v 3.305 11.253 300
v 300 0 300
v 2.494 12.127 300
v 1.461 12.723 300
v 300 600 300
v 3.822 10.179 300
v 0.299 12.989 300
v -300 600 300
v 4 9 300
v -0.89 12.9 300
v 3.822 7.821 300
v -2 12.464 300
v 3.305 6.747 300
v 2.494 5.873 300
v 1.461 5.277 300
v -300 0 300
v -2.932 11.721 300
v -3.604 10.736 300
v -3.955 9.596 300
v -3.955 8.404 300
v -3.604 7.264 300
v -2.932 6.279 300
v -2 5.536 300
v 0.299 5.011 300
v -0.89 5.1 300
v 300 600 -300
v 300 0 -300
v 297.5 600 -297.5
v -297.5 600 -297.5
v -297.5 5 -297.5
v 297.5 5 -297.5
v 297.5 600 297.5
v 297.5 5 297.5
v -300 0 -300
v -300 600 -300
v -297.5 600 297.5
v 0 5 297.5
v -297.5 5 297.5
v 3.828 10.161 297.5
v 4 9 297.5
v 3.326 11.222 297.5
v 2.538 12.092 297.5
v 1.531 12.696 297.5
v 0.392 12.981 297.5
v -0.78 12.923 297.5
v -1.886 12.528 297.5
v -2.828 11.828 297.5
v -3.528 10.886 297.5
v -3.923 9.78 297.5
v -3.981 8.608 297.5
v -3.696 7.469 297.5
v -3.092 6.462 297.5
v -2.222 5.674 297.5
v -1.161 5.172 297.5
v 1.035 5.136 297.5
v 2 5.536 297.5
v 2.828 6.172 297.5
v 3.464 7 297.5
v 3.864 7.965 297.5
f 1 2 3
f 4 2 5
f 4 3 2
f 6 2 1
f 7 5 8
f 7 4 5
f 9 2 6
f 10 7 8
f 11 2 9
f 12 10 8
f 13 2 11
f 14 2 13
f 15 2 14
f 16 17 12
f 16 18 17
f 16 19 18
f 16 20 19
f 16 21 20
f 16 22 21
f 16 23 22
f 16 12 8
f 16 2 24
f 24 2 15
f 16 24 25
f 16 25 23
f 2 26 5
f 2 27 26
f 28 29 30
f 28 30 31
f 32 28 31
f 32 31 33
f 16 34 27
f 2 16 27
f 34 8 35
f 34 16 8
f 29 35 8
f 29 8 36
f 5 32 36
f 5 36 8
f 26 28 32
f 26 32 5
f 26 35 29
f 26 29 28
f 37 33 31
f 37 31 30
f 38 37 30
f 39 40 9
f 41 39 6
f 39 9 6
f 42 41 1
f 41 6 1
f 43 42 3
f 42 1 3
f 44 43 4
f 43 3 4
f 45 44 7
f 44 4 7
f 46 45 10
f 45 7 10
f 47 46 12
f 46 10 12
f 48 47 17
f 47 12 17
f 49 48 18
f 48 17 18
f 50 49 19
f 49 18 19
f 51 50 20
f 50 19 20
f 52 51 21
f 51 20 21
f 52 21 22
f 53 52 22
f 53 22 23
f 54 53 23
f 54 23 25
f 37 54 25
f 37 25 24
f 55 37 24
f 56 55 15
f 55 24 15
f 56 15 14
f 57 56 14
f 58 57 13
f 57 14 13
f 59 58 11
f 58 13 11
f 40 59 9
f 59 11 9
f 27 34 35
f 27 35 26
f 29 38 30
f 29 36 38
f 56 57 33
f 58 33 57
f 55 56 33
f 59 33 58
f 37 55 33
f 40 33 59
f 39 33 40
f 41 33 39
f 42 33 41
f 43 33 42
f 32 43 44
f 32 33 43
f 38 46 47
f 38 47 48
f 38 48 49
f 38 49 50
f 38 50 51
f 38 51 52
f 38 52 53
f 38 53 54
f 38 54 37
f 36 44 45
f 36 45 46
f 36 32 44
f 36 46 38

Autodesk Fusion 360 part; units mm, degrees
sketch "Sketch1" plane through (0, 0, 0) normal (0, 1, 0) x (1, 0, 0)
  line L0 (300, -300) -> (-300, -300)
  line L1 (-300, -300) -> (-300, 300)
  line L2 (-300, 300) -> (300, 300)
  line L3 (300, 300) -> (300, -300)
  line L4 (300, -300) -> (-300, 300) construction
  line L5 (-300, -300) -> (300, 300) construction
  dimension "d1" = 600
  dimension "d2" = 600
extrude "Extrude1" add sketch "Sketch1" along normal blind 600 in component "Component"
sketch "Sketch2" plane through (0, 600, 0) normal (0, 1, 0) x (-1, 0, 0)
  line L0 (-300, -300) -> (300, -300)
  line L1 (300, -300) -> (300, 300)
  line L2 (300, 300) -> (-300, 300)
  line L3 (-300, 300) -> (-300, -300)
  line L4 (-297.5, 297.5) -> (297.5, 297.5)
  line L5 (297.5, 297.5) -> (297.5, -297.5)
  line L6 (297.5, -297.5) -> (-297.5, -297.5)
  line L7 (-297.5, -297.5) -> (-297.5, 297.5)
  line L8 (-297.5, 297.5) -> (297.5, -297.5) construction
  line L9 (297.5, 297.5) -> (-297.5, -297.5) construction
  dimension "d5" = 595
  dimension "d6" = 595
extrude "Extrude2" cut sketch "Sketch2" against normal blind 595 contours L4 L5 L6 L7 in component "Component"
sketch "Sketch3" plane through (0, 0, 300) normal (0, 0, 1) x (1, 0, 0)
  line L0 (-300, 0) -> (300, 0)
  line L1 (300, 0) -> (300, 600)
  line L2 (300, 600) -> (-300, 600)
  line L3 (-300, 600) -> (-300, 0)
  circle A0 centre (0, 9) radius 4
  point P0 (0, 5)
  point P1 (0, 9)
  dimension "d9" = 5
  dimension "d10" = 4
  dimension "d11" = 8
extrude "Extrude3" cut sketch "Sketch3" against normal blind 30 contours A0 in component "Component"
component "Component" placed x (1, 0, 0) y (0, 1, 0) z (0, 0, 1) at (0, 0, 0)
